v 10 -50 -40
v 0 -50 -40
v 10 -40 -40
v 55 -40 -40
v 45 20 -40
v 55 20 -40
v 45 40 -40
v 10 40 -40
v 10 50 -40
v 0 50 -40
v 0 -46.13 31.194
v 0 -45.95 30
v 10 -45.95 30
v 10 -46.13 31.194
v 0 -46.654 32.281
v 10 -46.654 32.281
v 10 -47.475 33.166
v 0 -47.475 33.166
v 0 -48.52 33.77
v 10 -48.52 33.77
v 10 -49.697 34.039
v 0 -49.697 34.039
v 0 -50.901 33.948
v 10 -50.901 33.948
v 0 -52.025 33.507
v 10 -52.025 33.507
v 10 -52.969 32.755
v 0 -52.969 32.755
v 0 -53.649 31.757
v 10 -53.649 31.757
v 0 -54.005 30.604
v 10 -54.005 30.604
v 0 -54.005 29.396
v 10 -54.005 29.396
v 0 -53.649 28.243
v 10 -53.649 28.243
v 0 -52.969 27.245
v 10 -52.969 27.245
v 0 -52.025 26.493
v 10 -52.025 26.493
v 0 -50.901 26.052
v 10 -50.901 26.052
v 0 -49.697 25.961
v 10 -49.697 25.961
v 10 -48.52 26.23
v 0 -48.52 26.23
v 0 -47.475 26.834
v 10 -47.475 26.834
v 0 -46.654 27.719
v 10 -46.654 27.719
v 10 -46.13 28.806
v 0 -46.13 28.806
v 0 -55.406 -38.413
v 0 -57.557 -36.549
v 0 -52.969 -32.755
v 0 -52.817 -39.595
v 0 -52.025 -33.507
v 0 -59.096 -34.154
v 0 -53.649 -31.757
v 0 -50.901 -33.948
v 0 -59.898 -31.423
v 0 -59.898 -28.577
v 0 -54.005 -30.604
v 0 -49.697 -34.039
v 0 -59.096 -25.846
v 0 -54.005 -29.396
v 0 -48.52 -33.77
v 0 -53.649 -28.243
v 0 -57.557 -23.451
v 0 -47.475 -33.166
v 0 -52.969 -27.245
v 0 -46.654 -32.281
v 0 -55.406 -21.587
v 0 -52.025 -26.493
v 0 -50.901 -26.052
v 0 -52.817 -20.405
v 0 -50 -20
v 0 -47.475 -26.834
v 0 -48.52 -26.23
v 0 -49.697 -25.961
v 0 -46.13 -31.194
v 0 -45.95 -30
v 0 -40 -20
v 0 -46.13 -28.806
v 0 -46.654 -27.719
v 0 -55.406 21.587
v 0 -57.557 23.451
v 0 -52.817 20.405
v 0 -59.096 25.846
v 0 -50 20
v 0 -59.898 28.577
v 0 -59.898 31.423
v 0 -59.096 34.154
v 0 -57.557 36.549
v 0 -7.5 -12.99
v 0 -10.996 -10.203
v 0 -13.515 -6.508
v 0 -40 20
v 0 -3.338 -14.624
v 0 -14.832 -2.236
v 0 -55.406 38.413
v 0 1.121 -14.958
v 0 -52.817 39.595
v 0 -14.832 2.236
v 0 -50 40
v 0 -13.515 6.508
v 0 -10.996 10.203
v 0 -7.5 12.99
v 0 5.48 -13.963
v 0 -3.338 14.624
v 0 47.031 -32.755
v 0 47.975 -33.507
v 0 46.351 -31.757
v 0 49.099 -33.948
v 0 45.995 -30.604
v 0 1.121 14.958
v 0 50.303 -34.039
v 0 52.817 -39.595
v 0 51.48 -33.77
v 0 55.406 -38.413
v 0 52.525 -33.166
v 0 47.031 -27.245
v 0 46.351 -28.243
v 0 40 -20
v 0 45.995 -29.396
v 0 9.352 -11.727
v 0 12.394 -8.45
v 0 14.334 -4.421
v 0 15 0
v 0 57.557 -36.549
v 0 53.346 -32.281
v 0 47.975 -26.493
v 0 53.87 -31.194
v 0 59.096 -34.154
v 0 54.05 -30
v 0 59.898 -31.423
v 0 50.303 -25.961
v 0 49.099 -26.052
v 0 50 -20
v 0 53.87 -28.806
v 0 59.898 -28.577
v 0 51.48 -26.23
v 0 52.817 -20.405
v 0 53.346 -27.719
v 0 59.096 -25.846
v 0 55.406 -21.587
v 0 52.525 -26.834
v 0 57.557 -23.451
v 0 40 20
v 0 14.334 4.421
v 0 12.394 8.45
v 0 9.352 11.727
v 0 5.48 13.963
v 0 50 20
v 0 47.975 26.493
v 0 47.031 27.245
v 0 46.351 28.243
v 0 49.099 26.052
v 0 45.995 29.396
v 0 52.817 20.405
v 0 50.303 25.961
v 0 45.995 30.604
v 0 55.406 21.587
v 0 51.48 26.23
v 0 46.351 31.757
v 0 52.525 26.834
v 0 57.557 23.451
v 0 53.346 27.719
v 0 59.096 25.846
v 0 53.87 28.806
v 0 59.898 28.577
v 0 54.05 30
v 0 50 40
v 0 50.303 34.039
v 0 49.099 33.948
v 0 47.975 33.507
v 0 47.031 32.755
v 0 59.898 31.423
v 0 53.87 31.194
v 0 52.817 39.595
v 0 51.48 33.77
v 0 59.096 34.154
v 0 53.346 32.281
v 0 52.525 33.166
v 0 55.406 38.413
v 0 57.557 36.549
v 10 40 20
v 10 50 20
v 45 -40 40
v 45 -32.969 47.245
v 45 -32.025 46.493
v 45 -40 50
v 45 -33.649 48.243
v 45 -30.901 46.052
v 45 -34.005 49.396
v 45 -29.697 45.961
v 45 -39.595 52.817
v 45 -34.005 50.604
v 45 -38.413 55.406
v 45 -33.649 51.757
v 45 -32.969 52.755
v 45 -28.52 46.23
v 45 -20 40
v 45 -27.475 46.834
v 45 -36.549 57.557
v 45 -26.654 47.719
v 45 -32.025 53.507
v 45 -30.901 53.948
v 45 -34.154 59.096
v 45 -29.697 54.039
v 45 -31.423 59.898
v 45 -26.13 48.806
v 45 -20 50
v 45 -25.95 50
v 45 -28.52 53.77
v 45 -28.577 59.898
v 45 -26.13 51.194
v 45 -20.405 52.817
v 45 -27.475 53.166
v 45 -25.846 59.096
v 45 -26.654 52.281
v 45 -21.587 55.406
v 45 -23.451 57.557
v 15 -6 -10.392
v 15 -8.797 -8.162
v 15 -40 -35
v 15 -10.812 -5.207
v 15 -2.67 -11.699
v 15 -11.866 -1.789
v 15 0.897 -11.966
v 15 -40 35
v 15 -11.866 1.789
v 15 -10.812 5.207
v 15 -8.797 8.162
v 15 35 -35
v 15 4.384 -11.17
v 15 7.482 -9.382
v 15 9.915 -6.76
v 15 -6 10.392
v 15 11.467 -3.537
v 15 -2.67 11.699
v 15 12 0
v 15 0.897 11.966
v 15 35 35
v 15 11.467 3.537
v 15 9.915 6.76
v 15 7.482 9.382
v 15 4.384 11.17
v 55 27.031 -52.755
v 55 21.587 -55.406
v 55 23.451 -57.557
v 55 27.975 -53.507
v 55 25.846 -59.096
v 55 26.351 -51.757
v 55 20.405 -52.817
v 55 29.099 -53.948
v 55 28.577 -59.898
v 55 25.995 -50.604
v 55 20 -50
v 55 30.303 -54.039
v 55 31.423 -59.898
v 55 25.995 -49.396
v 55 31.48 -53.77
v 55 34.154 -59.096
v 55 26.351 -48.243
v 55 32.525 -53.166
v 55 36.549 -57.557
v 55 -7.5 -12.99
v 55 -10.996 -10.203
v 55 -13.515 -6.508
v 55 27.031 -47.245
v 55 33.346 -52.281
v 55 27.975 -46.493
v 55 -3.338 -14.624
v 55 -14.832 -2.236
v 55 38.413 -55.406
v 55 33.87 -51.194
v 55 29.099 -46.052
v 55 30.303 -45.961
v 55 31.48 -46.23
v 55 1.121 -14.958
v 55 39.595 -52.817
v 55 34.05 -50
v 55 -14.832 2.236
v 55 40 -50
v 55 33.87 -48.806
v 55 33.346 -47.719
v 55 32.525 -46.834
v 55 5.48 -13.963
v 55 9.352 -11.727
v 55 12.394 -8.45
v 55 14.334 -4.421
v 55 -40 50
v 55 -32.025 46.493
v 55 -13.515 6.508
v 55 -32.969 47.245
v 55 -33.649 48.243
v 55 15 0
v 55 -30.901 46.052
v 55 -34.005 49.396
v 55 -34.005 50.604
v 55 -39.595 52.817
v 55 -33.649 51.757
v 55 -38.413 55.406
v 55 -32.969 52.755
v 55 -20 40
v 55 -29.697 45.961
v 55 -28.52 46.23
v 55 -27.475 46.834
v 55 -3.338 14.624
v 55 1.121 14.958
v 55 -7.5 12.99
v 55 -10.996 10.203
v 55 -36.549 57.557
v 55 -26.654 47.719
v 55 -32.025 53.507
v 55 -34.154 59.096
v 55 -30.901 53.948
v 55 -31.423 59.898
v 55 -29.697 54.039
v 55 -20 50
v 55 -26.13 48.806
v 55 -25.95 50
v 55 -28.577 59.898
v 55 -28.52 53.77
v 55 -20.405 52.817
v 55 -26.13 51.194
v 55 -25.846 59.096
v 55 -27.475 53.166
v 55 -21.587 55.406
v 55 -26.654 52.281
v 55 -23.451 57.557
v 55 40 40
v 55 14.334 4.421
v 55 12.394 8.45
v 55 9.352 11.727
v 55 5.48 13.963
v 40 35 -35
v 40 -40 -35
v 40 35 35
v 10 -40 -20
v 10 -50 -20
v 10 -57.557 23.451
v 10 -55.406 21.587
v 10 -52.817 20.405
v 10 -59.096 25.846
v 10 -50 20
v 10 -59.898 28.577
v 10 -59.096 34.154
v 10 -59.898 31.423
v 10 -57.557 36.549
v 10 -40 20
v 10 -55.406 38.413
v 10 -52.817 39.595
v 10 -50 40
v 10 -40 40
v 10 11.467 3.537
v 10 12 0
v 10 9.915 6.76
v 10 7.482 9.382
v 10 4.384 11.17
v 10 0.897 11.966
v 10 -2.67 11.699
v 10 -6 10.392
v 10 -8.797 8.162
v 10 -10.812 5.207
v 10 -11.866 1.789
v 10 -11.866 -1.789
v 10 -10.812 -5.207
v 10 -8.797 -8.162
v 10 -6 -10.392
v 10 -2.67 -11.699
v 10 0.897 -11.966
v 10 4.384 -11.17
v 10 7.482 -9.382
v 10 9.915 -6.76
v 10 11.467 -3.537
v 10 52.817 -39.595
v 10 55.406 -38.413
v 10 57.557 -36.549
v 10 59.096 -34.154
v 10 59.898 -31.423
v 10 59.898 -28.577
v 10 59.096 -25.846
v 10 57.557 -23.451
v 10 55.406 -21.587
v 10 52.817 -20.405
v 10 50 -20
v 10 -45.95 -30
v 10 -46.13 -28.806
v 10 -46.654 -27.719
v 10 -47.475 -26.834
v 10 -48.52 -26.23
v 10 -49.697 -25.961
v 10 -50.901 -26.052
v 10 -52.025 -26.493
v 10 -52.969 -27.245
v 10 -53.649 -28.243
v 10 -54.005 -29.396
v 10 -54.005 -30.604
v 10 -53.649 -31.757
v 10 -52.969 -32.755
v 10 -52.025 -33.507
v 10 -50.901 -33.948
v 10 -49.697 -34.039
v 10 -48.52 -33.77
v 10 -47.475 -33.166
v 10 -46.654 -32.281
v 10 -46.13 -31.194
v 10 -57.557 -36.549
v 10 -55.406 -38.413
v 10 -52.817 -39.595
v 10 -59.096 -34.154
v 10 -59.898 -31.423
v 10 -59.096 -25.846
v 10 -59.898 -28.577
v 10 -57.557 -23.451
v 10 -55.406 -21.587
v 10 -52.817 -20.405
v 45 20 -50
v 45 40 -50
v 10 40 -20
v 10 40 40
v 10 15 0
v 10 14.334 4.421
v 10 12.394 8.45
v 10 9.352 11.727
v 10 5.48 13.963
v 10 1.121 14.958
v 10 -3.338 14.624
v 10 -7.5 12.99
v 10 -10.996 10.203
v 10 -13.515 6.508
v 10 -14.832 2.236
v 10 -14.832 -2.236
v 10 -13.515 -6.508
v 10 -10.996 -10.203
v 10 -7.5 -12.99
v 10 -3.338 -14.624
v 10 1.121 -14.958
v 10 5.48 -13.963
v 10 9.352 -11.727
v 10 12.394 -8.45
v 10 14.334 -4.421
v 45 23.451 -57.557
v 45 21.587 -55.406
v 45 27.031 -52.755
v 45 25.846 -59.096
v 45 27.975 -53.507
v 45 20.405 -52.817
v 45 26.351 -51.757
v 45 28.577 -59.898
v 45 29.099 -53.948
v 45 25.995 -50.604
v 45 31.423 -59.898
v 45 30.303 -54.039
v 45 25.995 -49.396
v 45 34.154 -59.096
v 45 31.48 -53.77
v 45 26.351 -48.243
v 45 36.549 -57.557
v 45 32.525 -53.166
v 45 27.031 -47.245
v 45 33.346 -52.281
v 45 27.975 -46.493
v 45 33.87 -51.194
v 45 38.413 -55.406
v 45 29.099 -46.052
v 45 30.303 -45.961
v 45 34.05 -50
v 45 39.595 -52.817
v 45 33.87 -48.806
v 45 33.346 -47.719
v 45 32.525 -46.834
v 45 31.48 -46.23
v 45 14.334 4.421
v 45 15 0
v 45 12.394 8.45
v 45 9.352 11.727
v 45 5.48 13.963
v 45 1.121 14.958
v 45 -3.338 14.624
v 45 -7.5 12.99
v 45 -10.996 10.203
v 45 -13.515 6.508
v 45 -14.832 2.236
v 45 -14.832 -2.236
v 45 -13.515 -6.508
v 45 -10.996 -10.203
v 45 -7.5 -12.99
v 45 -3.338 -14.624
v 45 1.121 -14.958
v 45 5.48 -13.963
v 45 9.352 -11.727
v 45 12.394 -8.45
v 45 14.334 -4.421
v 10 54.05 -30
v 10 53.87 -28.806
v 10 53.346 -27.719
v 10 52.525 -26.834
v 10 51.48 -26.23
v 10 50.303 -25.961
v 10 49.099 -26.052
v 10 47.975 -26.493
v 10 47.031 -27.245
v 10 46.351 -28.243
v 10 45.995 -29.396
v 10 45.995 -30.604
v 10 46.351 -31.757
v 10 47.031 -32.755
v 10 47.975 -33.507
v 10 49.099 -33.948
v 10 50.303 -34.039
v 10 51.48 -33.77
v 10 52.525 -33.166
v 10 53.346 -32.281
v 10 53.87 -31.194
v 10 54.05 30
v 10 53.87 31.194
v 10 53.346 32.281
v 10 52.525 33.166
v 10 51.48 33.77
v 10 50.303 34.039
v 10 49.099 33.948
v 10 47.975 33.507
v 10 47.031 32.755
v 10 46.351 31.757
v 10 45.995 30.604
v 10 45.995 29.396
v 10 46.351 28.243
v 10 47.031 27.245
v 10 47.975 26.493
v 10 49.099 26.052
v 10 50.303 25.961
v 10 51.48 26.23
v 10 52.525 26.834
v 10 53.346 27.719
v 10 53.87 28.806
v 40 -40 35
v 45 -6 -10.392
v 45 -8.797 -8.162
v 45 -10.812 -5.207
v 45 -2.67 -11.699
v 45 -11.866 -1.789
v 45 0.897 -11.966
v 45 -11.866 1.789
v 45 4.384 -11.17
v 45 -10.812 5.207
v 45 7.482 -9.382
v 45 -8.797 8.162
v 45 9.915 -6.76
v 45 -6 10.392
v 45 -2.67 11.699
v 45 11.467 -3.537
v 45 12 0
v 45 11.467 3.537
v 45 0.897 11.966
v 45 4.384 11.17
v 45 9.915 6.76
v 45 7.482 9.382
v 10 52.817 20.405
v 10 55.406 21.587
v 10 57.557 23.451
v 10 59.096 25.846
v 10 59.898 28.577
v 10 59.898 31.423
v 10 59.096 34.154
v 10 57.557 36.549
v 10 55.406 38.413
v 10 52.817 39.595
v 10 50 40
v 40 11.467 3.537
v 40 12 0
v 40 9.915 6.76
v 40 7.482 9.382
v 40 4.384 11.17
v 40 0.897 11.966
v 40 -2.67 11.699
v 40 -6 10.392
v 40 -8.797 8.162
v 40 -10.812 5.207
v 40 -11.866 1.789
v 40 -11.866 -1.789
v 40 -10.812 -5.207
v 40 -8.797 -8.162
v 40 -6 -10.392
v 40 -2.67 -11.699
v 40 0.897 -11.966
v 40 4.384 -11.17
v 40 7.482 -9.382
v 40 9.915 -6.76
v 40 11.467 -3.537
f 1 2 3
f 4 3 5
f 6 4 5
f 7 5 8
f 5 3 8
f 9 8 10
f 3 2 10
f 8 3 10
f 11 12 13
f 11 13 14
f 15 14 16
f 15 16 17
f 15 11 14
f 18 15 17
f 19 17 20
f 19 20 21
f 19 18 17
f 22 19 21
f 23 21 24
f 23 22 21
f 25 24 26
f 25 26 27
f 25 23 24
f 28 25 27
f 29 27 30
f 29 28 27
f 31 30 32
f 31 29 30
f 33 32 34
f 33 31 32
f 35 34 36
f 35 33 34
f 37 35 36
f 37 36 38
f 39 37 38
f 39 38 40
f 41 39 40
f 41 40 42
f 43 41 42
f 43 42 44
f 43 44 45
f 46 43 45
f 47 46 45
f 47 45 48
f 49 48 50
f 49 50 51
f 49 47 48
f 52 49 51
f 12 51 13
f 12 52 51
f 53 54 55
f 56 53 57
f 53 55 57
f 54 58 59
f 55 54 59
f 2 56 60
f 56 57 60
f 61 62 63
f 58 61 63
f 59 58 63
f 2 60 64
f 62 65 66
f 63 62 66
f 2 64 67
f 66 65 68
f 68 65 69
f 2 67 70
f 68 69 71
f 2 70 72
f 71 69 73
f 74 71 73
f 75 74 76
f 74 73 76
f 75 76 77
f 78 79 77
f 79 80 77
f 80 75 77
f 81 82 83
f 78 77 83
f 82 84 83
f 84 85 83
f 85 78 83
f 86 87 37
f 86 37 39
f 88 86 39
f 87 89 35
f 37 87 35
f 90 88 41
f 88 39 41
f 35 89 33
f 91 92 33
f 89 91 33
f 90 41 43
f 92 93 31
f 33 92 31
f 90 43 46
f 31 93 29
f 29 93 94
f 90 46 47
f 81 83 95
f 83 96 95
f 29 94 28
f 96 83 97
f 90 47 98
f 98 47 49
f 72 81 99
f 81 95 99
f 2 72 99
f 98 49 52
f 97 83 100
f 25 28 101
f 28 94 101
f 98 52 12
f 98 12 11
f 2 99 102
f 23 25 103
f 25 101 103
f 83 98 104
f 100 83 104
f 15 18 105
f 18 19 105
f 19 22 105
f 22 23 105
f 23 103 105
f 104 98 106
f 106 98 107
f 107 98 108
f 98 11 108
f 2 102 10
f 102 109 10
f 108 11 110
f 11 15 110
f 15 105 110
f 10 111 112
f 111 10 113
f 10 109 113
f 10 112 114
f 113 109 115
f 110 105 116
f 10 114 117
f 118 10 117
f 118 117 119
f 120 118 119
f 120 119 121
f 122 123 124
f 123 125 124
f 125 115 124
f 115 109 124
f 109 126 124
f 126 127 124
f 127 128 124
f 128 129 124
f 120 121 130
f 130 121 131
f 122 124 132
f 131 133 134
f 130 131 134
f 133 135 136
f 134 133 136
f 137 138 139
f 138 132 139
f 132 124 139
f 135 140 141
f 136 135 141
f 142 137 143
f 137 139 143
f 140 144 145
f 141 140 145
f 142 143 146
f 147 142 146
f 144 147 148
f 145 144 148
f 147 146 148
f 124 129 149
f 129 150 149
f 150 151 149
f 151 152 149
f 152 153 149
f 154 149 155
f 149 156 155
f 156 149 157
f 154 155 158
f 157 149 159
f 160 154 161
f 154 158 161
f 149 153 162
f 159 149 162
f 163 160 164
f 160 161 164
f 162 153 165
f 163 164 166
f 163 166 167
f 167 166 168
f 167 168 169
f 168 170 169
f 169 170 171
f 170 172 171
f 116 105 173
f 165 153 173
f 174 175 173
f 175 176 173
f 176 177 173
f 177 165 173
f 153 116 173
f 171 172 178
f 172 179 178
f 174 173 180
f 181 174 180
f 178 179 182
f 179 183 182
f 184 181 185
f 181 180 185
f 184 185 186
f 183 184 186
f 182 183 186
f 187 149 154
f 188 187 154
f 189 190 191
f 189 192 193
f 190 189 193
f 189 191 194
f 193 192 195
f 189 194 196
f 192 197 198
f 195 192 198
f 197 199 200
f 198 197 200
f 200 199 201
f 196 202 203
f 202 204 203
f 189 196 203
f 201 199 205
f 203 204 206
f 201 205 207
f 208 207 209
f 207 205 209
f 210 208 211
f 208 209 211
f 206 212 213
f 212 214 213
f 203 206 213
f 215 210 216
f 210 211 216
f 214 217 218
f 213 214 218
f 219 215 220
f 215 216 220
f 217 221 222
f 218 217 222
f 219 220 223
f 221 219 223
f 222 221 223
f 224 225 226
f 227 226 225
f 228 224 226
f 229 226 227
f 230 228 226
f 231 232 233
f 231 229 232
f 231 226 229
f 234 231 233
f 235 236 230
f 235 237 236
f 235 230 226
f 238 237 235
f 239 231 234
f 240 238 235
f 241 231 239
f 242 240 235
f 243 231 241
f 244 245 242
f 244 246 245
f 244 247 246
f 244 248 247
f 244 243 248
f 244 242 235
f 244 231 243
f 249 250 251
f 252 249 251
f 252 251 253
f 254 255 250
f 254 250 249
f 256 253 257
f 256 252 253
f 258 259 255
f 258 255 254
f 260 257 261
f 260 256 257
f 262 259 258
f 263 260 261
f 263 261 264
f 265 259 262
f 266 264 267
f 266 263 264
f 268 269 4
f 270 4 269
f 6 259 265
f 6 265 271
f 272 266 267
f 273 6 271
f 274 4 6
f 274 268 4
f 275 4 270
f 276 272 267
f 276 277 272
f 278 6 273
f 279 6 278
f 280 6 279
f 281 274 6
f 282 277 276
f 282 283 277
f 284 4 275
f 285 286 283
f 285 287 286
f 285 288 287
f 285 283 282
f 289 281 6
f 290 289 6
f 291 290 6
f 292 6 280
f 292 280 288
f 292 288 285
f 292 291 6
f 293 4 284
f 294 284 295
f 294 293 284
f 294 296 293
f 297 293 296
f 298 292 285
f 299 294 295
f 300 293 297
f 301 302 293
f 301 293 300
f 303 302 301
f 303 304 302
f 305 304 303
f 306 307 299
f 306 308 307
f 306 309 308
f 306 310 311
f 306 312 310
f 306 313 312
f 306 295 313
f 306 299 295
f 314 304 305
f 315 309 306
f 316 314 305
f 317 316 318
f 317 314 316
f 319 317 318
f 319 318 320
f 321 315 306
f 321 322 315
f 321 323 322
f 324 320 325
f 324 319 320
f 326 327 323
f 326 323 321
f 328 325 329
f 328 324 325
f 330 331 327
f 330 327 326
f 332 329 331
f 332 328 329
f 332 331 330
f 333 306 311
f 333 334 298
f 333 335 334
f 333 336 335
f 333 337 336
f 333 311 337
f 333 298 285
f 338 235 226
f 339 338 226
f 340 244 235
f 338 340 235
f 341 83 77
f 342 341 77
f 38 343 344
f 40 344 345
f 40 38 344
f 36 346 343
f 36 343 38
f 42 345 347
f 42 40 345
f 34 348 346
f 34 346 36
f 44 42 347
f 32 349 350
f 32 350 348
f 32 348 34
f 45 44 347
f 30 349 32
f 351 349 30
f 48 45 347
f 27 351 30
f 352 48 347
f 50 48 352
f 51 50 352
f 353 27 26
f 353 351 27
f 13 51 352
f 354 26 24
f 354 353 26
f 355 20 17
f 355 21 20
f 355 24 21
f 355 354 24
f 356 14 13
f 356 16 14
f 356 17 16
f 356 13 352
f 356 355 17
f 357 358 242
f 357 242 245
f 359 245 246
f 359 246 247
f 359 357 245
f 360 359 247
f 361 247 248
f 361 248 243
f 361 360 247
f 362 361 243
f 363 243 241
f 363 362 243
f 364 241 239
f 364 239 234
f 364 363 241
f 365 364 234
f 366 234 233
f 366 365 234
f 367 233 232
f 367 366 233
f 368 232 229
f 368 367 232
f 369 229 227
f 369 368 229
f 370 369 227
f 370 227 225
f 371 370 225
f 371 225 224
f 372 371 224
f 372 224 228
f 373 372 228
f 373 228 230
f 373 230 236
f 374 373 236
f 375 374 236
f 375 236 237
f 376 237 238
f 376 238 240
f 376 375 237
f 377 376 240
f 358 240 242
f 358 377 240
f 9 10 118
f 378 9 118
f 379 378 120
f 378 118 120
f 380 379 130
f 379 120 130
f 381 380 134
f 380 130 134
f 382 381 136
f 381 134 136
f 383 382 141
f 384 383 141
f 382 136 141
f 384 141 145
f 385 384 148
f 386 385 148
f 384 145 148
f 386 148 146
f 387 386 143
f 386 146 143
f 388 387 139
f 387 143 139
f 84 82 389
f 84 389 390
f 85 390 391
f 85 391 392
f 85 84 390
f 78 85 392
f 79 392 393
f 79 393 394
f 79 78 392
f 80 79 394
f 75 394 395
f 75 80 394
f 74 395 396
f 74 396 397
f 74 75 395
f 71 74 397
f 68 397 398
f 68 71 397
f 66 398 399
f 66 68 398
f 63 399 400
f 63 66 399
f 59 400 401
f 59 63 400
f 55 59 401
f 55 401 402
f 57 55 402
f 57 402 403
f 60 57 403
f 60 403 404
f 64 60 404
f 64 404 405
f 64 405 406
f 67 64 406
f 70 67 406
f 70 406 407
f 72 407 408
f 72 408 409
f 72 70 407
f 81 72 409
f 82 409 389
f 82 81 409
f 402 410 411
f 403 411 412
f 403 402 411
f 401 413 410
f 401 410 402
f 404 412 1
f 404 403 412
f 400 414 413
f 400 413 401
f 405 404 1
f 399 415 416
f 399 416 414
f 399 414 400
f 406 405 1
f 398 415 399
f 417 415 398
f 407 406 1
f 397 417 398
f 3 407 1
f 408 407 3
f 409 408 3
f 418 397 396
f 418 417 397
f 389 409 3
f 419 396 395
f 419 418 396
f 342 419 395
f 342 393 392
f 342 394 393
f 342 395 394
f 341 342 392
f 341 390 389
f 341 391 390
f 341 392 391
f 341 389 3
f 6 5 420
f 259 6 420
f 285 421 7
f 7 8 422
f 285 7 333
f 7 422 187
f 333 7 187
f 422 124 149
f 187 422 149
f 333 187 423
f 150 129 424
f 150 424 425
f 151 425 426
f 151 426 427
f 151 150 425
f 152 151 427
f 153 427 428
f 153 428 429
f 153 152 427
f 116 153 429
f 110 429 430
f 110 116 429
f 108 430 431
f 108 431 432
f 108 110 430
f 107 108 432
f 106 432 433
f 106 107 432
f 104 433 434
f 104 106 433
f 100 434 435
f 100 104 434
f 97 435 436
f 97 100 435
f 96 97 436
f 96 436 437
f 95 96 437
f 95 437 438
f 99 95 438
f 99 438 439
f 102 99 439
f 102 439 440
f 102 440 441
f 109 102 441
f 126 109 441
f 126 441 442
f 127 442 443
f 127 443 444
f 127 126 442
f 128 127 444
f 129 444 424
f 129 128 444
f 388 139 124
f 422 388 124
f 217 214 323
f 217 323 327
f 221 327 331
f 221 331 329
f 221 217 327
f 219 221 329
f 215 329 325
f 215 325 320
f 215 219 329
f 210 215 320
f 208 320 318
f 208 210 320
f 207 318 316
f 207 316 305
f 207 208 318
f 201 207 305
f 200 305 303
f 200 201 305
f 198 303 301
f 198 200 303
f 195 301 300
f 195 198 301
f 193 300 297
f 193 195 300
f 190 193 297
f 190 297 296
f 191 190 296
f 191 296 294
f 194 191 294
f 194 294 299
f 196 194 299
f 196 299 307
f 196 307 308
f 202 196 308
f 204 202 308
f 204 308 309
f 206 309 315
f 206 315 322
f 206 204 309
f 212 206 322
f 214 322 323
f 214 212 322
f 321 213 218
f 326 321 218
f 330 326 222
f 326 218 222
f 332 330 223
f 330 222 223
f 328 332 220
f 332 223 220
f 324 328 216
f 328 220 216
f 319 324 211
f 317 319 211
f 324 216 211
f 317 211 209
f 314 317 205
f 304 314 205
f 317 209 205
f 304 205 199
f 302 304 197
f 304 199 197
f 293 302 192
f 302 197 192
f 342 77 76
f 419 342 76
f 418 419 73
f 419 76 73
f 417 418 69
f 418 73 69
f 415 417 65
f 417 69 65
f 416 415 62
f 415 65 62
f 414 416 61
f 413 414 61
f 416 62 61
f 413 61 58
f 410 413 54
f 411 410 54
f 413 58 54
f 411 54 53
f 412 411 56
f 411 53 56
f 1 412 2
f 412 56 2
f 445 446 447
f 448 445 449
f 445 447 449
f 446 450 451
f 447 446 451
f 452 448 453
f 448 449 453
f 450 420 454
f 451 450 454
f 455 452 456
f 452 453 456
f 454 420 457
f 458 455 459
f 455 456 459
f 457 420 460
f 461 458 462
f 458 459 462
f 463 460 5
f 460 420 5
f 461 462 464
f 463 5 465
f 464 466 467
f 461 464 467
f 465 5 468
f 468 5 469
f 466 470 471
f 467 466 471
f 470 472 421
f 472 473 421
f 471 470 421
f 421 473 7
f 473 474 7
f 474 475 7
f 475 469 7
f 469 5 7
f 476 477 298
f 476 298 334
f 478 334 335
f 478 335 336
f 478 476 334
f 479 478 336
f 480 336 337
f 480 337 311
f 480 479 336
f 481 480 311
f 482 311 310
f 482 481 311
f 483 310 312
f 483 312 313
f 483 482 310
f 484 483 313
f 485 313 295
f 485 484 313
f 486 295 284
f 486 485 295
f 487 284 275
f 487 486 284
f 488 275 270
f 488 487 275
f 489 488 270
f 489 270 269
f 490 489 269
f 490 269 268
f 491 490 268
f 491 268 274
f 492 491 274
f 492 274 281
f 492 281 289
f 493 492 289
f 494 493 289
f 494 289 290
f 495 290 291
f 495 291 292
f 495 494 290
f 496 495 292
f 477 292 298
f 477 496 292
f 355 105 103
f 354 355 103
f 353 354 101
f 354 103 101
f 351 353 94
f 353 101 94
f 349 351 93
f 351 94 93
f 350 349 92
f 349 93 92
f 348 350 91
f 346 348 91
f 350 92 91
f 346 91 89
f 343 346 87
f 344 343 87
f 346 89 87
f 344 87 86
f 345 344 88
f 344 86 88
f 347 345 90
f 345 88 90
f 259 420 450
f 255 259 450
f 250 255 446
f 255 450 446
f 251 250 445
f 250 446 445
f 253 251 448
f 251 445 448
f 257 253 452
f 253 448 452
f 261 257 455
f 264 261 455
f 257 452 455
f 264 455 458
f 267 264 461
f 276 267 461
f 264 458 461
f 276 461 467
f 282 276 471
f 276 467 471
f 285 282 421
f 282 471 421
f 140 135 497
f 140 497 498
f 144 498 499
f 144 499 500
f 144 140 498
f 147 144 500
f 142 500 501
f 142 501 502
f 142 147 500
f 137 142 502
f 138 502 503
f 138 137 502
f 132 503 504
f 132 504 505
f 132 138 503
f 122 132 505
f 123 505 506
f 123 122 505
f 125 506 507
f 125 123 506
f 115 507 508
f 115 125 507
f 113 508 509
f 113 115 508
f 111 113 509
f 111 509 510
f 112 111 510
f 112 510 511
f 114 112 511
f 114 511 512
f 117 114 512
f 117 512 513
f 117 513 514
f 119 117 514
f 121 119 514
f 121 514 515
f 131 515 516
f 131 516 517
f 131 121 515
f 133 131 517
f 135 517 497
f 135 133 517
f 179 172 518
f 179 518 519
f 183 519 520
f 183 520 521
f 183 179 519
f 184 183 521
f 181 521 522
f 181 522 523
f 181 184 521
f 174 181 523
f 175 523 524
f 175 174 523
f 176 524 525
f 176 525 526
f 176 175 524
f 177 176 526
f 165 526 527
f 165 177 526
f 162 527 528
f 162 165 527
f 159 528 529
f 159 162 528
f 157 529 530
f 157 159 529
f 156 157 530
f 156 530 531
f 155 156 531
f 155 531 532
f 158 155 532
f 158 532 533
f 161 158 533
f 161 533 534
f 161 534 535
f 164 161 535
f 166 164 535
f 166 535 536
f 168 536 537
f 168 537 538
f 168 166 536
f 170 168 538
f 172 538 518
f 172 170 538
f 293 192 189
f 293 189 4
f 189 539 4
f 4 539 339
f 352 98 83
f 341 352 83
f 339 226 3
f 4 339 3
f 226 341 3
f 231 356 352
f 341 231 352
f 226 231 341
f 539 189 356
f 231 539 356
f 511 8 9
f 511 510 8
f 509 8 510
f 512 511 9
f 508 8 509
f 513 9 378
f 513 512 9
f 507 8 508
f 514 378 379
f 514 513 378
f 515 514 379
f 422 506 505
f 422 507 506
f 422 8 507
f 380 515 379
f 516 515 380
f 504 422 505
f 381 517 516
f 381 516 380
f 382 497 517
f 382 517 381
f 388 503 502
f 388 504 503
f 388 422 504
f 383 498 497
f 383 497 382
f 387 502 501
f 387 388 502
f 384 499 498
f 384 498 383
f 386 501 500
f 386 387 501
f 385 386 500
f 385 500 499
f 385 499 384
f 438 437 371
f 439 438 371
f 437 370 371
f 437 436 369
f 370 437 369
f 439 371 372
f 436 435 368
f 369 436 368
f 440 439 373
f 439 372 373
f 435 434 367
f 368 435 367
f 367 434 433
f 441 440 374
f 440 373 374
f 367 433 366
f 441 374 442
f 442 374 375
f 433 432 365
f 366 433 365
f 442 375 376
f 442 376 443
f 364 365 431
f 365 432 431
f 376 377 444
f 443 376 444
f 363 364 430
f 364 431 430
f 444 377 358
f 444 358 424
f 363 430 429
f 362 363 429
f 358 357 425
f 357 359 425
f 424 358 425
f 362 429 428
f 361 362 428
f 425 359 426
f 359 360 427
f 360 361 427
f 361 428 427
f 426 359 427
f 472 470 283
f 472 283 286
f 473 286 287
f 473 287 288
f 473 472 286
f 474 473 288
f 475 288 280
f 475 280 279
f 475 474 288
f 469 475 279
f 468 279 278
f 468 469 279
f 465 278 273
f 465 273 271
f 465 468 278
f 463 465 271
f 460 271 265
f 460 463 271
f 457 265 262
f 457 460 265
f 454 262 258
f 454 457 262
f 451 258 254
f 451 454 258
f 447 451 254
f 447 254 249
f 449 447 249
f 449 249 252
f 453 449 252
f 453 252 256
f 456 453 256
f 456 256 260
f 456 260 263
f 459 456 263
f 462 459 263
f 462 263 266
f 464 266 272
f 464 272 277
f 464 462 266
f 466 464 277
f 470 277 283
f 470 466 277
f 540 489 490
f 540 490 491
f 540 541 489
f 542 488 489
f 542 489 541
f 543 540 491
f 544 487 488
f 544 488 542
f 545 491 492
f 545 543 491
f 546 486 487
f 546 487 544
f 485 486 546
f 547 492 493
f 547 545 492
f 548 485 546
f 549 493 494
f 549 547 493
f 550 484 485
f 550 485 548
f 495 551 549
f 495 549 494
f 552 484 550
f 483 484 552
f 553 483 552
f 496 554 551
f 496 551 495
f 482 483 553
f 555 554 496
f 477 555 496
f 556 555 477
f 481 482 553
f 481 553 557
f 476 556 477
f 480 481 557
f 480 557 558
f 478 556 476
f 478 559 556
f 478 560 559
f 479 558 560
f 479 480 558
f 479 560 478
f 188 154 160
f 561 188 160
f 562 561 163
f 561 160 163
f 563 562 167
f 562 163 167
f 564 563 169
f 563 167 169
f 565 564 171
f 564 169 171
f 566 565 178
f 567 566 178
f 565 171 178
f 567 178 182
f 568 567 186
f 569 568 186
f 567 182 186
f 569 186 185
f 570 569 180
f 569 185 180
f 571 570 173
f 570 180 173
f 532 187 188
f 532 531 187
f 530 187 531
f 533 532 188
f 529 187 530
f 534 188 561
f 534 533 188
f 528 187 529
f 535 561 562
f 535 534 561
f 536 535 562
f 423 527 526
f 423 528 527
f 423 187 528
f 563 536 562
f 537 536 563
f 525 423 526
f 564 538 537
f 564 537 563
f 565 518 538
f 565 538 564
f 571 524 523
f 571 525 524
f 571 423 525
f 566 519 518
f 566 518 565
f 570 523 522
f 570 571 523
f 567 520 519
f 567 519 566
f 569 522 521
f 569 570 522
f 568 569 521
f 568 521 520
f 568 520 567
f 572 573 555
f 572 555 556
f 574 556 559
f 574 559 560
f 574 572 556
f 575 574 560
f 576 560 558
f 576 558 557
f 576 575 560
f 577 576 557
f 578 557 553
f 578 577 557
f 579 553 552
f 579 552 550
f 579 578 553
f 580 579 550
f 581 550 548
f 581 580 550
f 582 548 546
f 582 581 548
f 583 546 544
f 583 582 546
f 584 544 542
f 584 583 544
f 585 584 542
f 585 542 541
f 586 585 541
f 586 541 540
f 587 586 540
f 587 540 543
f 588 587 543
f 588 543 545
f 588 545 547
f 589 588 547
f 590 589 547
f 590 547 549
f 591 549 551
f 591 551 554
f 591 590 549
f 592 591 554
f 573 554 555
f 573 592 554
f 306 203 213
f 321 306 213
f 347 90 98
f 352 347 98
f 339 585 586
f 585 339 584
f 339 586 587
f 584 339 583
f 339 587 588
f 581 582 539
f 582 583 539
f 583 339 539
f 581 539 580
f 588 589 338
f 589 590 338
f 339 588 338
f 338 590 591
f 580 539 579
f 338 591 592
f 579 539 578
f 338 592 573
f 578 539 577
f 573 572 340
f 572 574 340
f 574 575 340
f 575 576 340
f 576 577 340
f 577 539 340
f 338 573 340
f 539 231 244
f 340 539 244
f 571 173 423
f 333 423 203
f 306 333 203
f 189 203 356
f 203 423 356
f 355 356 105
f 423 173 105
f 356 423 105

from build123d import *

# Parameters (mm, degrees)
F0_R     = 15
F0_R_2   = 4.05
F1_DEPTH = 10
F2_START = 10
F0_R_3   = 12
F2_DEPTH = 5
F3_START = 15
F3_DEPTH = 25
F4_START = 40
F4_DEPTH = 5
F5_START = 45
F5_DEPTH = 10
F6_START = 45
F6_DEPTH = 10
F7_DEPTH = 10


with BuildPart() as f1:
    # F0 (on Right) → F1 (new body)
    with BuildSketch(Plane.YZ):
        Polygon((35, -40), (40, -40), (40, -20), (40, 20), (40, 25), (40, 35), (40, 40), (-20, 40), (-40, 40), (-40, 35), (35, 35), (35, -35), (-40, -35), (-40, -40), (20, -40), align=None)
        Polygon((-40, -20), (-40, -35), (35, -35), (35, 35), (-40, 35), (-40, 20), align=None)
        Circle(F0_R, mode=Mode.SUBTRACT)
        with BuildLine():
            Line((-50, 20), (-40, 20))
            Line((-40, 20), (-40, 35))
            Line((-40, 35), (-40, 40))
            Line((-40, 40), (-50, 40))
            ThreePointArc((-50, 40), (-60, 30), (-50, 20))
        make_face()
        with Locations((-50, 30)):
            Circle(F0_R_2, mode=Mode.SUBTRACT)
        with BuildLine():
            Line((-50, -40), (-40, -40))
            Line((-40, -40), (-40, -35))
            Line((-40, -35), (-40, -20))
            Line((-40, -20), (-50, -20))
            ThreePointArc((-50, -20), (-60, -30), (-50, -40))
        make_face()
        with Locations((-50, -30)):
            Circle(F0_R_2, mode=Mode.SUBTRACT)
    extrude(amount=F1_DEPTH)

    # F0 (on Right) → F2 (join)
    with BuildSketch(Plane.YZ.offset(F2_START)):
        Polygon((-40, -20), (-40, -35), (35, -35), (35, 35), (-40, 35), (-40, 20), align=None)
        Circle(F0_R, mode=Mode.SUBTRACT)
        Polygon((35, -40), (40, -40), (40, -20), (40, 20), (40, 25), (40, 35), (40, 40), (-20, 40), (-40, 40), (-40, 35), (35, 35), (35, -35), (-40, -35), (-40, -40), (20, -40), align=None)
        Circle(F0_R)
        Circle(F0_R_3, mode=Mode.SUBTRACT)
    extrude(amount=F2_DEPTH)

    # F0 (on Right) → F3 (join)
    with BuildSketch(Plane.YZ.offset(F3_START)):
        Polygon((35, -40), (40, -40), (40, -20), (40, 20), (40, 25), (40, 35), (40, 40), (-20, 40), (-40, 40), (-40, 35), (35, 35), (35, -35), (-40, -35), (-40, -40), (20, -40), align=None)
    extrude(amount=F3_DEPTH)

    # F0 (on Right) → F4 (join)
    with BuildSketch(Plane.YZ.offset(F4_START)):
        Polygon((35, -40), (40, -40), (40, -20), (40, 20), (40, 25), (40, 35), (40, 40), (-20, 40), (-40, 40), (-40, 35), (35, 35), (35, -35), (-40, -35), (-40, -40), (20, -40), align=None)
        Polygon((-40, -20), (-40, -35), (35, -35), (35, 35), (-40, 35), (-40, 20), align=None)
        Circle(F0_R, mode=Mode.SUBTRACT)
        Circle(F0_R)
        Circle(F0_R_3, mode=Mode.SUBTRACT)
    extrude(amount=F4_DEPTH)

    # F0 (on Right) → F5 (join)
    with BuildSketch(Plane.YZ.offset(F5_START)):
        Polygon((35, -40), (40, -40), (40, -20), (40, 20), (40, 25), (40, 35), (40, 40), (-20, 40), (-40, 40), (-40, 35), (35, 35), (35, -35), (-40, -35), (-40, -40), (20, -40), align=None)
        Polygon((-40, -20), (-40, -35), (35, -35), (35, 35), (-40, 35), (-40, 20), align=None)
        Circle(F0_R, mode=Mode.SUBTRACT)
    extrude(amount=F5_DEPTH)

    # F0 (on Right) → F6 (join)
    with BuildSketch(Plane.YZ.offset(F6_START)):
        with BuildLine():
            Line((-40, 40), (-20, 40))
            Line((-20, 40), (-20, 50))
            ThreePointArc((-20, 50), (-30, 60), (-40, 50))
            Line((-40, 50), (-40, 40))
        make_face()
        with Locations((-30, 50)):
            Circle(F0_R_2, mode=Mode.SUBTRACT)
        with BuildLine():
            Line((40, -50), (40, -40))
            Line((40, -40), (35, -40))
            Line((35, -40), (20, -40))
            Line((20, -40), (20, -50))
            ThreePointArc((20, -50), (30, -60), (40, -50))
        make_face()
        with Locations((30, -50)):
            Circle(F0_R_2, mode=Mode.SUBTRACT)
    extrude(amount=F6_DEPTH)

    # F0 (on Right) → F7 (join)
    with BuildSketch(Plane.YZ):
        with BuildLine():
            Line((40, 25), (40, 20))
            Line((40, 20), (50, 20))
            ThreePointArc((50, 20), (60, 30), (50, 40))
            Line((50, 40), (40, 40))
            Line((40, 40), (40, 35))
            Line((40, 35), (40, 25))
        make_face()
        with Locations((50, 30)):
            Circle(F0_R_2, mode=Mode.SUBTRACT)
        with BuildLine():
            Line((40, -20), (40, -40))
            Line((40, -40), (50, -40))
            ThreePointArc((50, -40), (60, -30), (50, -20))
            Line((50, -20), (40, -20))
        make_face()
        with Locations((50, -30)):
            Circle(F0_R_2, mode=Mode.SUBTRACT)
    extrude(amount=F7_DEPTH)


solid = f1.part
